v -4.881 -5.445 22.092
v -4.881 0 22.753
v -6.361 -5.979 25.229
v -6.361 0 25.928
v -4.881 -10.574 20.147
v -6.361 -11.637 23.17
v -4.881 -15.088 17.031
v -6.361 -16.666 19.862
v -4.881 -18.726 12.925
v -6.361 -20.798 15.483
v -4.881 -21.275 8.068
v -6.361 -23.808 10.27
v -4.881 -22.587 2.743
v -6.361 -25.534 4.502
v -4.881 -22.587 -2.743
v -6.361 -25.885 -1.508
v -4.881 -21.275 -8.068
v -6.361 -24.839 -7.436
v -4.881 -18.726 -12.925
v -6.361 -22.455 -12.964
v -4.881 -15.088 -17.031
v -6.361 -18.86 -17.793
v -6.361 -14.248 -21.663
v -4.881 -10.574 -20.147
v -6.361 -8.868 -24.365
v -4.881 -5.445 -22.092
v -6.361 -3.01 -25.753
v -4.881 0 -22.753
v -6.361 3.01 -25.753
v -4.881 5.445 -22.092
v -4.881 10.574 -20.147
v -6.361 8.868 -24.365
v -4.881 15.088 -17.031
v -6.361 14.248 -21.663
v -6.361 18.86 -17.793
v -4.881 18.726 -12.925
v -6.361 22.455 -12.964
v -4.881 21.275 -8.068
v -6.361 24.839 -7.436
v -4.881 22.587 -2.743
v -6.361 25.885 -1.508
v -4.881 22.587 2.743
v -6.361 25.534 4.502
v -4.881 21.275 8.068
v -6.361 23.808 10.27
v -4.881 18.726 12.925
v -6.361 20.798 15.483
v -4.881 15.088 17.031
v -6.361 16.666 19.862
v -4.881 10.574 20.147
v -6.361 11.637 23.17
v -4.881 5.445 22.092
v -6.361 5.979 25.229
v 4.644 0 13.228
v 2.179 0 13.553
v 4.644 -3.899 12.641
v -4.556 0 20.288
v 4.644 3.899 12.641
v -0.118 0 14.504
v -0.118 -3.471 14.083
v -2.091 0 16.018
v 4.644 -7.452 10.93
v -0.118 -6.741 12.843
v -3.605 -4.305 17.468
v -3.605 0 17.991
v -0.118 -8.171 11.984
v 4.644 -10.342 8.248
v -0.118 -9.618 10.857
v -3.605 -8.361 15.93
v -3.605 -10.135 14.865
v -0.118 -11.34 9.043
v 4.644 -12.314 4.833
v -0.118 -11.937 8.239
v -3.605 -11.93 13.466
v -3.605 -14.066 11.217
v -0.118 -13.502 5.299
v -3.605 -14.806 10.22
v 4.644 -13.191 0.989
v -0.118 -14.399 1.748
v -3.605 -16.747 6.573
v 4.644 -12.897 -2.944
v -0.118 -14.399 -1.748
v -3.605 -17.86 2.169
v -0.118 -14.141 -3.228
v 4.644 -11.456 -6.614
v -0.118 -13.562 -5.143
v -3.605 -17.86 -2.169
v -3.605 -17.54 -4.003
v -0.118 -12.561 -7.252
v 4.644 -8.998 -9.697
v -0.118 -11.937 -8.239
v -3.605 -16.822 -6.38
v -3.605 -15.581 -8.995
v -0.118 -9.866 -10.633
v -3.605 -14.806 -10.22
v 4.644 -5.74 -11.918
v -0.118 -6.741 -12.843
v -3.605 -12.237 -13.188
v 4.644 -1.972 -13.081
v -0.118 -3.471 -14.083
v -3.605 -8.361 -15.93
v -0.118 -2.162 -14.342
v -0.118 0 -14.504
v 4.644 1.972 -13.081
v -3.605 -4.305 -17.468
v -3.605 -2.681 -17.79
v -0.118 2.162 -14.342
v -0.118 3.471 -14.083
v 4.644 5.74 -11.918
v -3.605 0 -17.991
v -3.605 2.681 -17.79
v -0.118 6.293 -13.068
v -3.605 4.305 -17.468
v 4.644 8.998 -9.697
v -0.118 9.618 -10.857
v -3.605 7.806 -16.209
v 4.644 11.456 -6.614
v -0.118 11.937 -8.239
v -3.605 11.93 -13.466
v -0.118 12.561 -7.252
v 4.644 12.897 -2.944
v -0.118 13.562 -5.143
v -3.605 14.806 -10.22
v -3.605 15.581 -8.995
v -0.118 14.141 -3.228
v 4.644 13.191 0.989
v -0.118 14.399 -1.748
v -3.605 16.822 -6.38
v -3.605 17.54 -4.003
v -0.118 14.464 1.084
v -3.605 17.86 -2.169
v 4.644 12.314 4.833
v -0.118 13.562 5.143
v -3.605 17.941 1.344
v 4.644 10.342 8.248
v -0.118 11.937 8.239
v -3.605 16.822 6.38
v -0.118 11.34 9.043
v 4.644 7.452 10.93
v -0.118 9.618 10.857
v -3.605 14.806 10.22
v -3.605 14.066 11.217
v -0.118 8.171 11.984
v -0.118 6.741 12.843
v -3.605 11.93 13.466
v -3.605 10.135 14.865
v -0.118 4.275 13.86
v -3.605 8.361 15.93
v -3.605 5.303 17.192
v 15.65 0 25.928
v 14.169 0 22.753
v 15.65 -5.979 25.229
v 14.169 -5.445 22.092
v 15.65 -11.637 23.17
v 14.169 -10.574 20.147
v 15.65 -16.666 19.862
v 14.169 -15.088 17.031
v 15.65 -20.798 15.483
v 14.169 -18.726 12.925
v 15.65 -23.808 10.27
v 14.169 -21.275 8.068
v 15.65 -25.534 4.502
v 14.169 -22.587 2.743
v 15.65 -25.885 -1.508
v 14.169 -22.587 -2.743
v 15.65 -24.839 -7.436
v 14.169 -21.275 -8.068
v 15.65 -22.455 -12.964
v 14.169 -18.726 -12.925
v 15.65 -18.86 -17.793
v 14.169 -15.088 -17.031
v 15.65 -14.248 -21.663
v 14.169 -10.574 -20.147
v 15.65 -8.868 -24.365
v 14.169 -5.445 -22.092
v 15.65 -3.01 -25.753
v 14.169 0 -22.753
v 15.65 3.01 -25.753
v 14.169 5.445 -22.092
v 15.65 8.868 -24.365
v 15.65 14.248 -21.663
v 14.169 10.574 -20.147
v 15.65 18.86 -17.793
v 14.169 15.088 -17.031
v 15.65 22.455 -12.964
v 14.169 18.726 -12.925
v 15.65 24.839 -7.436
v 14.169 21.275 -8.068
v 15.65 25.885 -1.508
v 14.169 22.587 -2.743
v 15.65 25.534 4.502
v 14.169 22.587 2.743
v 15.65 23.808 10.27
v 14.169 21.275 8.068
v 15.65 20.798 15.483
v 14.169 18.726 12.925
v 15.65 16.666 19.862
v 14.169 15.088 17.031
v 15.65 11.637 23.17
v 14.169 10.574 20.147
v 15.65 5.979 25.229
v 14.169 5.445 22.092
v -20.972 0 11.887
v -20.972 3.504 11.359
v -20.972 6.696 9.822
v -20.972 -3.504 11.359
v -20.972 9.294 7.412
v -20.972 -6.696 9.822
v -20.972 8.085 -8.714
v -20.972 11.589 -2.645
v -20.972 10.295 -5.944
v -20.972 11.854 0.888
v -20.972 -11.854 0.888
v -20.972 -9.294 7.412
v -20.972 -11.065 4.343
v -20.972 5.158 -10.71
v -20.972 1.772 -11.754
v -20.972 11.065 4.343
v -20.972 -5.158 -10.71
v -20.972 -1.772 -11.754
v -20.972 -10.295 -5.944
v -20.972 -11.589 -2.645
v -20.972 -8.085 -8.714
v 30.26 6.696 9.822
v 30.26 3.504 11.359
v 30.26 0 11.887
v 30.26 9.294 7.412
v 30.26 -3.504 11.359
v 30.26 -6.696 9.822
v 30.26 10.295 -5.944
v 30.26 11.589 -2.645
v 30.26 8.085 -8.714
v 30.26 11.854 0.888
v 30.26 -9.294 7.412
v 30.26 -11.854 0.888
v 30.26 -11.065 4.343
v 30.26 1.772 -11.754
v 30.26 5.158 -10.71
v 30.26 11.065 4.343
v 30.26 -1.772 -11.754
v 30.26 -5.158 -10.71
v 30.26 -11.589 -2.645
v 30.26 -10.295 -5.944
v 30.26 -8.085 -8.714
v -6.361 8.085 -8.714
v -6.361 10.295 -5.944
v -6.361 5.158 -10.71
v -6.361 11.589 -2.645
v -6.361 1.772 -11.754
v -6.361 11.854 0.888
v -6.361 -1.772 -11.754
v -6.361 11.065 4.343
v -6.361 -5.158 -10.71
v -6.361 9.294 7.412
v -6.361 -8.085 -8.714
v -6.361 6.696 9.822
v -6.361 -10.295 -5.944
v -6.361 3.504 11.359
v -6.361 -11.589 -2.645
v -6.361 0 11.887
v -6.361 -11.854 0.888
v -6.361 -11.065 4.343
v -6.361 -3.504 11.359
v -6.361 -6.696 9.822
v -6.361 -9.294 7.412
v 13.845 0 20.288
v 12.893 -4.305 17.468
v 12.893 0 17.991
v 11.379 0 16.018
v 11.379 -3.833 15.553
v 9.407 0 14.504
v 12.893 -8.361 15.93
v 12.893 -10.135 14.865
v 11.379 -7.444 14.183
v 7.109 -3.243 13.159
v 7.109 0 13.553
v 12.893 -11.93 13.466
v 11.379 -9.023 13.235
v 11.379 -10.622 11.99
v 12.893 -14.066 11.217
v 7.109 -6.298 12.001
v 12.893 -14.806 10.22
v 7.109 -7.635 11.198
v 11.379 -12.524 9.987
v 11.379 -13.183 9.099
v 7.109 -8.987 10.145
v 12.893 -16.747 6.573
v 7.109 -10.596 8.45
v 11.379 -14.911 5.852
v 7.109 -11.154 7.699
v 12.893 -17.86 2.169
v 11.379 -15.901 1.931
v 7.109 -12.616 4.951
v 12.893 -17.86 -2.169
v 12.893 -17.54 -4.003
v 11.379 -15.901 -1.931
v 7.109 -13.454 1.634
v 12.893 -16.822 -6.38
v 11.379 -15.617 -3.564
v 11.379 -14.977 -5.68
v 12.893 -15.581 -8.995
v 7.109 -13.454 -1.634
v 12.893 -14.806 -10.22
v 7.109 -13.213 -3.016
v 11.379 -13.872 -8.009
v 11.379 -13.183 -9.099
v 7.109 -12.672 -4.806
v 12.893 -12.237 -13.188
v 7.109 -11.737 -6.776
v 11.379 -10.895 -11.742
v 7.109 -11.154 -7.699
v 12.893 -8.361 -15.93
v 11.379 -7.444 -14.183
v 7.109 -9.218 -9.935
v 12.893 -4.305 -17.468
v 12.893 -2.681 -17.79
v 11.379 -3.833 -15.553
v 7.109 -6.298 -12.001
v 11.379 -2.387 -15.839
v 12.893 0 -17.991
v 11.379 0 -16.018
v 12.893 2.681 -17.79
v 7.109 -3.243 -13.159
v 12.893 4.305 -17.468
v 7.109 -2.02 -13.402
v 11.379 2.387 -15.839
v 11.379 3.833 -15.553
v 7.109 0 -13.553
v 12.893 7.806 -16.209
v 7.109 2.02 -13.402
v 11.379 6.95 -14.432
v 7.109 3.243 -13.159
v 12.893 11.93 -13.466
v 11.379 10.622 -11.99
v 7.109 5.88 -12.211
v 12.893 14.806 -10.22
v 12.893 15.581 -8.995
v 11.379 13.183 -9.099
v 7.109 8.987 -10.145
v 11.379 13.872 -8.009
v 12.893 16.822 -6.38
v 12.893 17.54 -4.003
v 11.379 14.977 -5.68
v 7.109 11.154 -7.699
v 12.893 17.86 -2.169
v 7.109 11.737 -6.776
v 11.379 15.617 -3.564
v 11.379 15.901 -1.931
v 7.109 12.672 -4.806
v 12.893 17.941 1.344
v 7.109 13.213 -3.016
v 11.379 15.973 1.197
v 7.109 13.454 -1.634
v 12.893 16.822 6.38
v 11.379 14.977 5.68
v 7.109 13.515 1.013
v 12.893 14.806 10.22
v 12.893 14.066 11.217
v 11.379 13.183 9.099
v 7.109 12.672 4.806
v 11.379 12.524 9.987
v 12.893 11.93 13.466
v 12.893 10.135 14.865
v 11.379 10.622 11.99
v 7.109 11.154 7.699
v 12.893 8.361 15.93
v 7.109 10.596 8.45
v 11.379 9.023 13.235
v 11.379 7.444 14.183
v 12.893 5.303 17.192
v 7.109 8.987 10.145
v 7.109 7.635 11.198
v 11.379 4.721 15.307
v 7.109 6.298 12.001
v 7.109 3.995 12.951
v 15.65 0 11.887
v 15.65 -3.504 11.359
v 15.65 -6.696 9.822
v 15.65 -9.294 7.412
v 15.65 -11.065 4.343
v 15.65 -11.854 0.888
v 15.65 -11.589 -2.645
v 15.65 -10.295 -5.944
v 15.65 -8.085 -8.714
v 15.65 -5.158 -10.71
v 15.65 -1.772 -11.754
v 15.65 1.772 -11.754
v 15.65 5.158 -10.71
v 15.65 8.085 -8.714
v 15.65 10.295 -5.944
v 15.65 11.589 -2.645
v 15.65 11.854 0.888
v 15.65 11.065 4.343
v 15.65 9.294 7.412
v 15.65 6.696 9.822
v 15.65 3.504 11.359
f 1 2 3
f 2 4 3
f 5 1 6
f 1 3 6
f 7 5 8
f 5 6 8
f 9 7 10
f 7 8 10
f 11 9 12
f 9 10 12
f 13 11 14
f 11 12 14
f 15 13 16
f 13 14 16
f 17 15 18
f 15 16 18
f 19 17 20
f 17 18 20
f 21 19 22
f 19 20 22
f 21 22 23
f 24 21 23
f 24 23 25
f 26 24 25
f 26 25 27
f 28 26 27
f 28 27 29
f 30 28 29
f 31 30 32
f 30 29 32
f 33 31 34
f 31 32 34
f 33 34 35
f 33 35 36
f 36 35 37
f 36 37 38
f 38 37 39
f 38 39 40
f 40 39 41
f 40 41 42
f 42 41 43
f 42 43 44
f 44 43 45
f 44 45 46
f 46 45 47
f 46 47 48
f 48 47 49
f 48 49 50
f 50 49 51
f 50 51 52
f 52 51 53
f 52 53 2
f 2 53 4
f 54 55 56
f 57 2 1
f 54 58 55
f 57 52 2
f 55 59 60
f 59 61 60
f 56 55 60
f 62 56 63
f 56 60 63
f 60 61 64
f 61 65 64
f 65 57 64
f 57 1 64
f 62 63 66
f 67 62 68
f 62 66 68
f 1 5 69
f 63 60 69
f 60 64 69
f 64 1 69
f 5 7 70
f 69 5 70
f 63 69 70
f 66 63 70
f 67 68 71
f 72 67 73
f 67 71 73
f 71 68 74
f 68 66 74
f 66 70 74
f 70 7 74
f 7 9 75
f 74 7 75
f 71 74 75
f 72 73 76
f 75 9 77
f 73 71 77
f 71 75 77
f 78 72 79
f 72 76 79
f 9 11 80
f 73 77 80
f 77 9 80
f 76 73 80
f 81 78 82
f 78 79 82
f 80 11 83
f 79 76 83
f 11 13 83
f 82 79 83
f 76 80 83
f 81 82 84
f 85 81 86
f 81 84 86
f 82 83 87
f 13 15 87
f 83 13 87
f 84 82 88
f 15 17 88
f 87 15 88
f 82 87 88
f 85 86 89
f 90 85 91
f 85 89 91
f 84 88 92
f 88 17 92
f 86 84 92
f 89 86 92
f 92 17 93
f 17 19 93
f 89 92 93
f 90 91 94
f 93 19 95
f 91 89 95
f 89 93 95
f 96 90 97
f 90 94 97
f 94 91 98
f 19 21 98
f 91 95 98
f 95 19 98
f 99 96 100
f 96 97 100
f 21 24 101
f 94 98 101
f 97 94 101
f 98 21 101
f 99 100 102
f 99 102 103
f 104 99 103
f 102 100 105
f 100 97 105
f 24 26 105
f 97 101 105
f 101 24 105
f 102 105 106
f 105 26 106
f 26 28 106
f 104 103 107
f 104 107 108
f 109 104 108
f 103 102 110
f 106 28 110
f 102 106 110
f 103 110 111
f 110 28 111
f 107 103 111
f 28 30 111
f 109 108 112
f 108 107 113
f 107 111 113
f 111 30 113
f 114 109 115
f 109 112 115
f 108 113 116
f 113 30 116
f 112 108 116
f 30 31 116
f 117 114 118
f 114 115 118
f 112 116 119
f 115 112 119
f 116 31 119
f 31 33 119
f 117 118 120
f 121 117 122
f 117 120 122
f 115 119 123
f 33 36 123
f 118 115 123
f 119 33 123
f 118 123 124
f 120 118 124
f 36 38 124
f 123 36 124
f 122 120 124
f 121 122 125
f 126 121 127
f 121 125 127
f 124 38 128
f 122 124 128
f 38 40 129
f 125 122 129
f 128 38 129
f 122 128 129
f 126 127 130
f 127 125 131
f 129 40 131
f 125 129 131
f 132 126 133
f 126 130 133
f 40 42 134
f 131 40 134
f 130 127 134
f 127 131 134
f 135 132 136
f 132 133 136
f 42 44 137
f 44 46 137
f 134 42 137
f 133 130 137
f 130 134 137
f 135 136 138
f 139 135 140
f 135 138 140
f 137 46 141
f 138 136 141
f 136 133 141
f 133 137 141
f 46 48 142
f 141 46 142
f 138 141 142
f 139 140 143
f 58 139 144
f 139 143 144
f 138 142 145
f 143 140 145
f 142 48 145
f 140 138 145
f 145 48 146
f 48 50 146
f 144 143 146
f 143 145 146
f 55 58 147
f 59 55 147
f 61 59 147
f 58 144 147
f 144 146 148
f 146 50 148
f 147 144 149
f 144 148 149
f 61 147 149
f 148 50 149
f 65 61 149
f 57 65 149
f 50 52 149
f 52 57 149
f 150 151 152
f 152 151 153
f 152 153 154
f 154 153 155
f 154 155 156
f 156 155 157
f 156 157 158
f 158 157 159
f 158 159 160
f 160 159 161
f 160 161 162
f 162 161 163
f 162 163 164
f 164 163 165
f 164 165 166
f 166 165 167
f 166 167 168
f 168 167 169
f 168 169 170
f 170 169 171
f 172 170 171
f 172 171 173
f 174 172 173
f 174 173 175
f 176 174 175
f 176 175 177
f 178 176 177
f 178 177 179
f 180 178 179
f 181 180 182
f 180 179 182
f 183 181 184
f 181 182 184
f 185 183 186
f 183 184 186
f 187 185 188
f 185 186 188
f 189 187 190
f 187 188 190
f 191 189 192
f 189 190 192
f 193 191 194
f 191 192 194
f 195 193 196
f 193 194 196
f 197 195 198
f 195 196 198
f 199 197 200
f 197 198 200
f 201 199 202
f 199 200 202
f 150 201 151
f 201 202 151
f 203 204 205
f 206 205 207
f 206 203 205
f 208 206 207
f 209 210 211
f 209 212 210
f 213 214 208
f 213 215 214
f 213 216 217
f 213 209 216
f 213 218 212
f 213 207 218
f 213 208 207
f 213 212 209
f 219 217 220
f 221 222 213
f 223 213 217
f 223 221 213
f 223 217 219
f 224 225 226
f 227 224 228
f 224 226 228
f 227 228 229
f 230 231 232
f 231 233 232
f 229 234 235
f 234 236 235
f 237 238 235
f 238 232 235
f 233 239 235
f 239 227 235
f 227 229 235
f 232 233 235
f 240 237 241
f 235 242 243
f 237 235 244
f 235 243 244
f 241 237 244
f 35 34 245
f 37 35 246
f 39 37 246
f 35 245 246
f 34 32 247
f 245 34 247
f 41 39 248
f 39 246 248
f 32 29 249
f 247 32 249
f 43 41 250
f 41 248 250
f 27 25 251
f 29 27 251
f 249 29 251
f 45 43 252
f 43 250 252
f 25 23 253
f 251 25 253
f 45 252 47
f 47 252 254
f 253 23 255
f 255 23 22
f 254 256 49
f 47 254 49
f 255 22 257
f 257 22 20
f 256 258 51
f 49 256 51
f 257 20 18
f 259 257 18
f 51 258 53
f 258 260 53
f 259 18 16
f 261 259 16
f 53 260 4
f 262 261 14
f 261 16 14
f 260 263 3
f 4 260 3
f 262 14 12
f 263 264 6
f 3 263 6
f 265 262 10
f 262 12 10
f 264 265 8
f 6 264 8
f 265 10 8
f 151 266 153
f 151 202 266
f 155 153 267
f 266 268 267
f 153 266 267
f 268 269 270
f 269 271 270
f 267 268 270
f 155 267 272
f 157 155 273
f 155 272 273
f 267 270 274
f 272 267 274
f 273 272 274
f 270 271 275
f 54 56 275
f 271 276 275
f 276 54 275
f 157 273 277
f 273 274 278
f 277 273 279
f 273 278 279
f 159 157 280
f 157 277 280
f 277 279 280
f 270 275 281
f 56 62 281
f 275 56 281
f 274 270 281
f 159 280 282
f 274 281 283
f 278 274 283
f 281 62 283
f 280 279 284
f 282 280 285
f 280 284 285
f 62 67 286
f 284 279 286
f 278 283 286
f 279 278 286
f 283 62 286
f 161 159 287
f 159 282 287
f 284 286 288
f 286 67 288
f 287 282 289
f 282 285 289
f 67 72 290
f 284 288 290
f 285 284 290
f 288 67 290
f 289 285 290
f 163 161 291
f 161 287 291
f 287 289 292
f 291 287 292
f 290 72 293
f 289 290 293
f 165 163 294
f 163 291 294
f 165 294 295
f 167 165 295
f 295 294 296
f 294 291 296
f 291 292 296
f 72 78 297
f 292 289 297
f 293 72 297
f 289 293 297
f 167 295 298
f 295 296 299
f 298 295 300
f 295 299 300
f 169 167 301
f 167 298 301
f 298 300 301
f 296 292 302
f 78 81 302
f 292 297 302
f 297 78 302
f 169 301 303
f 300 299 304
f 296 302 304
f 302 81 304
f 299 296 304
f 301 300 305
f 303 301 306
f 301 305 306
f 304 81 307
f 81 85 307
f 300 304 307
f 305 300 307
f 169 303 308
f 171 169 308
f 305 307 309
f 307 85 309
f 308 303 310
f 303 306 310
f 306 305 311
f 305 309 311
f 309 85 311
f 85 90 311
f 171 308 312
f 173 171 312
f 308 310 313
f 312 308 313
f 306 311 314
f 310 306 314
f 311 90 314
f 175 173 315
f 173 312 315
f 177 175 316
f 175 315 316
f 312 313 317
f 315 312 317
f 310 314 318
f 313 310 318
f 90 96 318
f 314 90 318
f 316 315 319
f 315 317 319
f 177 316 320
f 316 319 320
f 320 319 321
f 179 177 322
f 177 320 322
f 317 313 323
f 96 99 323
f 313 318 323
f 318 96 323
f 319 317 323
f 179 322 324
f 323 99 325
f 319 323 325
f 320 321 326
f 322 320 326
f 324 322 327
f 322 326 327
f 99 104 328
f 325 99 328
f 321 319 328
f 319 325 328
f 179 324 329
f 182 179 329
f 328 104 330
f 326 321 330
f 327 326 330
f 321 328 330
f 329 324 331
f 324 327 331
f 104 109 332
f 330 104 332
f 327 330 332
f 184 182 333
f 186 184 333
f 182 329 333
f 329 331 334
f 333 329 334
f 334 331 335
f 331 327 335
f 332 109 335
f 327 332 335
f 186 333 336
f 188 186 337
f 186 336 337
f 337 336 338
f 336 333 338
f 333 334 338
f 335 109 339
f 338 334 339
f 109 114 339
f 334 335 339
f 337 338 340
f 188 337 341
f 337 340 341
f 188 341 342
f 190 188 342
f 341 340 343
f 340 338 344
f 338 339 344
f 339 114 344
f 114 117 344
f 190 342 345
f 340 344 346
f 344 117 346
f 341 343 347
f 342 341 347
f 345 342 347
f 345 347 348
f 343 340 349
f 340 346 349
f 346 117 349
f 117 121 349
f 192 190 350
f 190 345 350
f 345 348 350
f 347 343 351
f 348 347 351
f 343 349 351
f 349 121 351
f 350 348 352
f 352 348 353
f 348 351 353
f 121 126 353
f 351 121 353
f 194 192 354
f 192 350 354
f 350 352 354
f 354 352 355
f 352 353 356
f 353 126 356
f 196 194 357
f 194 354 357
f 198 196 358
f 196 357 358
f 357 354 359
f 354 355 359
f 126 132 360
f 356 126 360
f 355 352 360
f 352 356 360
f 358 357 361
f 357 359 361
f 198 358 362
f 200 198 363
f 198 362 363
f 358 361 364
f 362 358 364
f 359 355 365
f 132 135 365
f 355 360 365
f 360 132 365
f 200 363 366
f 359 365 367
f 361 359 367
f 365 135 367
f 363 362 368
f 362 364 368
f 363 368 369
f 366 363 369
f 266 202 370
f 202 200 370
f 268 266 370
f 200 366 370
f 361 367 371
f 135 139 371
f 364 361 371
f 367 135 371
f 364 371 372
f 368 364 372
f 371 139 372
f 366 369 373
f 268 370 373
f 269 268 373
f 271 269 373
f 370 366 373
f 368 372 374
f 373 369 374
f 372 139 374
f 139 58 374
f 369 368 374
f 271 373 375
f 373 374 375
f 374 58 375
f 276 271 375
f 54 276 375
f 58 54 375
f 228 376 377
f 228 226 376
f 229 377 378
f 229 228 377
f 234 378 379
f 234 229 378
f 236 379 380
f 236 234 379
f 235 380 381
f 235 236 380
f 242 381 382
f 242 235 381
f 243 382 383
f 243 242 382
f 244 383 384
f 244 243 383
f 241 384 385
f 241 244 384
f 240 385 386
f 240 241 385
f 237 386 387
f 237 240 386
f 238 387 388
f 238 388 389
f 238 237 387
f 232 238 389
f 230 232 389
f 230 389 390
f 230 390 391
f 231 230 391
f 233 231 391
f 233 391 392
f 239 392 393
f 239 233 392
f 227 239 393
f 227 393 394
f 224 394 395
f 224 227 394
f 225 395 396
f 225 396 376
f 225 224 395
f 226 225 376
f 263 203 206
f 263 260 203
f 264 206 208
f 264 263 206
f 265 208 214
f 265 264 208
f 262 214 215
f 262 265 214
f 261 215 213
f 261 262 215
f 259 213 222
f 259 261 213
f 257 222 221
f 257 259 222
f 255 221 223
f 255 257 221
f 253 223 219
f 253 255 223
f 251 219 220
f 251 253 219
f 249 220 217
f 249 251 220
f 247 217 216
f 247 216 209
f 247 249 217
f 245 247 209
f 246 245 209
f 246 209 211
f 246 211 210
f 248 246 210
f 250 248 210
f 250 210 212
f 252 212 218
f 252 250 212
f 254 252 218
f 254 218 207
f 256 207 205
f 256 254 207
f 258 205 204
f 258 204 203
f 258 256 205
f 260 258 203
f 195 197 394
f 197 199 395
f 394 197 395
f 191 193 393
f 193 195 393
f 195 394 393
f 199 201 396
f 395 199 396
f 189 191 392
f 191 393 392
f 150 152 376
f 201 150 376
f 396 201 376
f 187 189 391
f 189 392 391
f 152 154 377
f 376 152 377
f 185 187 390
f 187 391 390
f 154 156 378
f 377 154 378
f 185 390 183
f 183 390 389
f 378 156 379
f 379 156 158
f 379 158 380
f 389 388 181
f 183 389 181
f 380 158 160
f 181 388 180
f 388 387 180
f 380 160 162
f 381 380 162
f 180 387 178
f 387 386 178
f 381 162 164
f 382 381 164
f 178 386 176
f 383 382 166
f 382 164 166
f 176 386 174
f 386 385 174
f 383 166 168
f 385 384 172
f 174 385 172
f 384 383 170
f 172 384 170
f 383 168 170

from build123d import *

# Parameters (mm, degrees)
F0_W = 14.6103731854
F0_H = 11.8872


# Not quite as in the source:
# - ends of sketch curves that miss each other by under 0.0002 mm in the source are joined


with BuildPart() as f1:
    # F0 (on Front) → F1 (revolve)
    with BuildSketch(Plane.XZ):
        with Locations((-13.6665977984, 5.9436)):
            Rectangle(F0_W, F0_H)
        with BuildLine():
            Line((-6.3614112057, 11.8872), (-6.3614112057, 0))
            Line((-6.3614112057, 0), (15.6496424236, 0))
            Line((15.6496424236, 0), (15.6496424236, 11.8872))
            Line((15.6496424236, 11.8872), (15.6496424236, 25.9283669293))
            Line((15.6496424236, 25.9283669293), (14.1691156089, 22.7533669293))
            ThreePointArc((14.1691156089, 22.7533669293), (11.3793089407, 16.0181760794), (4.6441191189, 13.2283669293))
            ThreePointArc((4.6441191189, 13.2283669293), (-2.0910777228, 16.0181760794), (-4.8808843911, 22.7533669293))
            Line((-4.8808843911, 22.7533669293), (-6.3614112057, 25.9283669293))
            Line((-6.3614112057, 25.9283669293), (-6.3614112057, 11.8872))
        make_face()
        with Locations((22.9548290163, 5.9436)):
            Rectangle(F0_W, F0_H)
    revolve(axis=Axis((4.6441156089, 0, 0), (1, 0, 0)))


solid = f1.part
